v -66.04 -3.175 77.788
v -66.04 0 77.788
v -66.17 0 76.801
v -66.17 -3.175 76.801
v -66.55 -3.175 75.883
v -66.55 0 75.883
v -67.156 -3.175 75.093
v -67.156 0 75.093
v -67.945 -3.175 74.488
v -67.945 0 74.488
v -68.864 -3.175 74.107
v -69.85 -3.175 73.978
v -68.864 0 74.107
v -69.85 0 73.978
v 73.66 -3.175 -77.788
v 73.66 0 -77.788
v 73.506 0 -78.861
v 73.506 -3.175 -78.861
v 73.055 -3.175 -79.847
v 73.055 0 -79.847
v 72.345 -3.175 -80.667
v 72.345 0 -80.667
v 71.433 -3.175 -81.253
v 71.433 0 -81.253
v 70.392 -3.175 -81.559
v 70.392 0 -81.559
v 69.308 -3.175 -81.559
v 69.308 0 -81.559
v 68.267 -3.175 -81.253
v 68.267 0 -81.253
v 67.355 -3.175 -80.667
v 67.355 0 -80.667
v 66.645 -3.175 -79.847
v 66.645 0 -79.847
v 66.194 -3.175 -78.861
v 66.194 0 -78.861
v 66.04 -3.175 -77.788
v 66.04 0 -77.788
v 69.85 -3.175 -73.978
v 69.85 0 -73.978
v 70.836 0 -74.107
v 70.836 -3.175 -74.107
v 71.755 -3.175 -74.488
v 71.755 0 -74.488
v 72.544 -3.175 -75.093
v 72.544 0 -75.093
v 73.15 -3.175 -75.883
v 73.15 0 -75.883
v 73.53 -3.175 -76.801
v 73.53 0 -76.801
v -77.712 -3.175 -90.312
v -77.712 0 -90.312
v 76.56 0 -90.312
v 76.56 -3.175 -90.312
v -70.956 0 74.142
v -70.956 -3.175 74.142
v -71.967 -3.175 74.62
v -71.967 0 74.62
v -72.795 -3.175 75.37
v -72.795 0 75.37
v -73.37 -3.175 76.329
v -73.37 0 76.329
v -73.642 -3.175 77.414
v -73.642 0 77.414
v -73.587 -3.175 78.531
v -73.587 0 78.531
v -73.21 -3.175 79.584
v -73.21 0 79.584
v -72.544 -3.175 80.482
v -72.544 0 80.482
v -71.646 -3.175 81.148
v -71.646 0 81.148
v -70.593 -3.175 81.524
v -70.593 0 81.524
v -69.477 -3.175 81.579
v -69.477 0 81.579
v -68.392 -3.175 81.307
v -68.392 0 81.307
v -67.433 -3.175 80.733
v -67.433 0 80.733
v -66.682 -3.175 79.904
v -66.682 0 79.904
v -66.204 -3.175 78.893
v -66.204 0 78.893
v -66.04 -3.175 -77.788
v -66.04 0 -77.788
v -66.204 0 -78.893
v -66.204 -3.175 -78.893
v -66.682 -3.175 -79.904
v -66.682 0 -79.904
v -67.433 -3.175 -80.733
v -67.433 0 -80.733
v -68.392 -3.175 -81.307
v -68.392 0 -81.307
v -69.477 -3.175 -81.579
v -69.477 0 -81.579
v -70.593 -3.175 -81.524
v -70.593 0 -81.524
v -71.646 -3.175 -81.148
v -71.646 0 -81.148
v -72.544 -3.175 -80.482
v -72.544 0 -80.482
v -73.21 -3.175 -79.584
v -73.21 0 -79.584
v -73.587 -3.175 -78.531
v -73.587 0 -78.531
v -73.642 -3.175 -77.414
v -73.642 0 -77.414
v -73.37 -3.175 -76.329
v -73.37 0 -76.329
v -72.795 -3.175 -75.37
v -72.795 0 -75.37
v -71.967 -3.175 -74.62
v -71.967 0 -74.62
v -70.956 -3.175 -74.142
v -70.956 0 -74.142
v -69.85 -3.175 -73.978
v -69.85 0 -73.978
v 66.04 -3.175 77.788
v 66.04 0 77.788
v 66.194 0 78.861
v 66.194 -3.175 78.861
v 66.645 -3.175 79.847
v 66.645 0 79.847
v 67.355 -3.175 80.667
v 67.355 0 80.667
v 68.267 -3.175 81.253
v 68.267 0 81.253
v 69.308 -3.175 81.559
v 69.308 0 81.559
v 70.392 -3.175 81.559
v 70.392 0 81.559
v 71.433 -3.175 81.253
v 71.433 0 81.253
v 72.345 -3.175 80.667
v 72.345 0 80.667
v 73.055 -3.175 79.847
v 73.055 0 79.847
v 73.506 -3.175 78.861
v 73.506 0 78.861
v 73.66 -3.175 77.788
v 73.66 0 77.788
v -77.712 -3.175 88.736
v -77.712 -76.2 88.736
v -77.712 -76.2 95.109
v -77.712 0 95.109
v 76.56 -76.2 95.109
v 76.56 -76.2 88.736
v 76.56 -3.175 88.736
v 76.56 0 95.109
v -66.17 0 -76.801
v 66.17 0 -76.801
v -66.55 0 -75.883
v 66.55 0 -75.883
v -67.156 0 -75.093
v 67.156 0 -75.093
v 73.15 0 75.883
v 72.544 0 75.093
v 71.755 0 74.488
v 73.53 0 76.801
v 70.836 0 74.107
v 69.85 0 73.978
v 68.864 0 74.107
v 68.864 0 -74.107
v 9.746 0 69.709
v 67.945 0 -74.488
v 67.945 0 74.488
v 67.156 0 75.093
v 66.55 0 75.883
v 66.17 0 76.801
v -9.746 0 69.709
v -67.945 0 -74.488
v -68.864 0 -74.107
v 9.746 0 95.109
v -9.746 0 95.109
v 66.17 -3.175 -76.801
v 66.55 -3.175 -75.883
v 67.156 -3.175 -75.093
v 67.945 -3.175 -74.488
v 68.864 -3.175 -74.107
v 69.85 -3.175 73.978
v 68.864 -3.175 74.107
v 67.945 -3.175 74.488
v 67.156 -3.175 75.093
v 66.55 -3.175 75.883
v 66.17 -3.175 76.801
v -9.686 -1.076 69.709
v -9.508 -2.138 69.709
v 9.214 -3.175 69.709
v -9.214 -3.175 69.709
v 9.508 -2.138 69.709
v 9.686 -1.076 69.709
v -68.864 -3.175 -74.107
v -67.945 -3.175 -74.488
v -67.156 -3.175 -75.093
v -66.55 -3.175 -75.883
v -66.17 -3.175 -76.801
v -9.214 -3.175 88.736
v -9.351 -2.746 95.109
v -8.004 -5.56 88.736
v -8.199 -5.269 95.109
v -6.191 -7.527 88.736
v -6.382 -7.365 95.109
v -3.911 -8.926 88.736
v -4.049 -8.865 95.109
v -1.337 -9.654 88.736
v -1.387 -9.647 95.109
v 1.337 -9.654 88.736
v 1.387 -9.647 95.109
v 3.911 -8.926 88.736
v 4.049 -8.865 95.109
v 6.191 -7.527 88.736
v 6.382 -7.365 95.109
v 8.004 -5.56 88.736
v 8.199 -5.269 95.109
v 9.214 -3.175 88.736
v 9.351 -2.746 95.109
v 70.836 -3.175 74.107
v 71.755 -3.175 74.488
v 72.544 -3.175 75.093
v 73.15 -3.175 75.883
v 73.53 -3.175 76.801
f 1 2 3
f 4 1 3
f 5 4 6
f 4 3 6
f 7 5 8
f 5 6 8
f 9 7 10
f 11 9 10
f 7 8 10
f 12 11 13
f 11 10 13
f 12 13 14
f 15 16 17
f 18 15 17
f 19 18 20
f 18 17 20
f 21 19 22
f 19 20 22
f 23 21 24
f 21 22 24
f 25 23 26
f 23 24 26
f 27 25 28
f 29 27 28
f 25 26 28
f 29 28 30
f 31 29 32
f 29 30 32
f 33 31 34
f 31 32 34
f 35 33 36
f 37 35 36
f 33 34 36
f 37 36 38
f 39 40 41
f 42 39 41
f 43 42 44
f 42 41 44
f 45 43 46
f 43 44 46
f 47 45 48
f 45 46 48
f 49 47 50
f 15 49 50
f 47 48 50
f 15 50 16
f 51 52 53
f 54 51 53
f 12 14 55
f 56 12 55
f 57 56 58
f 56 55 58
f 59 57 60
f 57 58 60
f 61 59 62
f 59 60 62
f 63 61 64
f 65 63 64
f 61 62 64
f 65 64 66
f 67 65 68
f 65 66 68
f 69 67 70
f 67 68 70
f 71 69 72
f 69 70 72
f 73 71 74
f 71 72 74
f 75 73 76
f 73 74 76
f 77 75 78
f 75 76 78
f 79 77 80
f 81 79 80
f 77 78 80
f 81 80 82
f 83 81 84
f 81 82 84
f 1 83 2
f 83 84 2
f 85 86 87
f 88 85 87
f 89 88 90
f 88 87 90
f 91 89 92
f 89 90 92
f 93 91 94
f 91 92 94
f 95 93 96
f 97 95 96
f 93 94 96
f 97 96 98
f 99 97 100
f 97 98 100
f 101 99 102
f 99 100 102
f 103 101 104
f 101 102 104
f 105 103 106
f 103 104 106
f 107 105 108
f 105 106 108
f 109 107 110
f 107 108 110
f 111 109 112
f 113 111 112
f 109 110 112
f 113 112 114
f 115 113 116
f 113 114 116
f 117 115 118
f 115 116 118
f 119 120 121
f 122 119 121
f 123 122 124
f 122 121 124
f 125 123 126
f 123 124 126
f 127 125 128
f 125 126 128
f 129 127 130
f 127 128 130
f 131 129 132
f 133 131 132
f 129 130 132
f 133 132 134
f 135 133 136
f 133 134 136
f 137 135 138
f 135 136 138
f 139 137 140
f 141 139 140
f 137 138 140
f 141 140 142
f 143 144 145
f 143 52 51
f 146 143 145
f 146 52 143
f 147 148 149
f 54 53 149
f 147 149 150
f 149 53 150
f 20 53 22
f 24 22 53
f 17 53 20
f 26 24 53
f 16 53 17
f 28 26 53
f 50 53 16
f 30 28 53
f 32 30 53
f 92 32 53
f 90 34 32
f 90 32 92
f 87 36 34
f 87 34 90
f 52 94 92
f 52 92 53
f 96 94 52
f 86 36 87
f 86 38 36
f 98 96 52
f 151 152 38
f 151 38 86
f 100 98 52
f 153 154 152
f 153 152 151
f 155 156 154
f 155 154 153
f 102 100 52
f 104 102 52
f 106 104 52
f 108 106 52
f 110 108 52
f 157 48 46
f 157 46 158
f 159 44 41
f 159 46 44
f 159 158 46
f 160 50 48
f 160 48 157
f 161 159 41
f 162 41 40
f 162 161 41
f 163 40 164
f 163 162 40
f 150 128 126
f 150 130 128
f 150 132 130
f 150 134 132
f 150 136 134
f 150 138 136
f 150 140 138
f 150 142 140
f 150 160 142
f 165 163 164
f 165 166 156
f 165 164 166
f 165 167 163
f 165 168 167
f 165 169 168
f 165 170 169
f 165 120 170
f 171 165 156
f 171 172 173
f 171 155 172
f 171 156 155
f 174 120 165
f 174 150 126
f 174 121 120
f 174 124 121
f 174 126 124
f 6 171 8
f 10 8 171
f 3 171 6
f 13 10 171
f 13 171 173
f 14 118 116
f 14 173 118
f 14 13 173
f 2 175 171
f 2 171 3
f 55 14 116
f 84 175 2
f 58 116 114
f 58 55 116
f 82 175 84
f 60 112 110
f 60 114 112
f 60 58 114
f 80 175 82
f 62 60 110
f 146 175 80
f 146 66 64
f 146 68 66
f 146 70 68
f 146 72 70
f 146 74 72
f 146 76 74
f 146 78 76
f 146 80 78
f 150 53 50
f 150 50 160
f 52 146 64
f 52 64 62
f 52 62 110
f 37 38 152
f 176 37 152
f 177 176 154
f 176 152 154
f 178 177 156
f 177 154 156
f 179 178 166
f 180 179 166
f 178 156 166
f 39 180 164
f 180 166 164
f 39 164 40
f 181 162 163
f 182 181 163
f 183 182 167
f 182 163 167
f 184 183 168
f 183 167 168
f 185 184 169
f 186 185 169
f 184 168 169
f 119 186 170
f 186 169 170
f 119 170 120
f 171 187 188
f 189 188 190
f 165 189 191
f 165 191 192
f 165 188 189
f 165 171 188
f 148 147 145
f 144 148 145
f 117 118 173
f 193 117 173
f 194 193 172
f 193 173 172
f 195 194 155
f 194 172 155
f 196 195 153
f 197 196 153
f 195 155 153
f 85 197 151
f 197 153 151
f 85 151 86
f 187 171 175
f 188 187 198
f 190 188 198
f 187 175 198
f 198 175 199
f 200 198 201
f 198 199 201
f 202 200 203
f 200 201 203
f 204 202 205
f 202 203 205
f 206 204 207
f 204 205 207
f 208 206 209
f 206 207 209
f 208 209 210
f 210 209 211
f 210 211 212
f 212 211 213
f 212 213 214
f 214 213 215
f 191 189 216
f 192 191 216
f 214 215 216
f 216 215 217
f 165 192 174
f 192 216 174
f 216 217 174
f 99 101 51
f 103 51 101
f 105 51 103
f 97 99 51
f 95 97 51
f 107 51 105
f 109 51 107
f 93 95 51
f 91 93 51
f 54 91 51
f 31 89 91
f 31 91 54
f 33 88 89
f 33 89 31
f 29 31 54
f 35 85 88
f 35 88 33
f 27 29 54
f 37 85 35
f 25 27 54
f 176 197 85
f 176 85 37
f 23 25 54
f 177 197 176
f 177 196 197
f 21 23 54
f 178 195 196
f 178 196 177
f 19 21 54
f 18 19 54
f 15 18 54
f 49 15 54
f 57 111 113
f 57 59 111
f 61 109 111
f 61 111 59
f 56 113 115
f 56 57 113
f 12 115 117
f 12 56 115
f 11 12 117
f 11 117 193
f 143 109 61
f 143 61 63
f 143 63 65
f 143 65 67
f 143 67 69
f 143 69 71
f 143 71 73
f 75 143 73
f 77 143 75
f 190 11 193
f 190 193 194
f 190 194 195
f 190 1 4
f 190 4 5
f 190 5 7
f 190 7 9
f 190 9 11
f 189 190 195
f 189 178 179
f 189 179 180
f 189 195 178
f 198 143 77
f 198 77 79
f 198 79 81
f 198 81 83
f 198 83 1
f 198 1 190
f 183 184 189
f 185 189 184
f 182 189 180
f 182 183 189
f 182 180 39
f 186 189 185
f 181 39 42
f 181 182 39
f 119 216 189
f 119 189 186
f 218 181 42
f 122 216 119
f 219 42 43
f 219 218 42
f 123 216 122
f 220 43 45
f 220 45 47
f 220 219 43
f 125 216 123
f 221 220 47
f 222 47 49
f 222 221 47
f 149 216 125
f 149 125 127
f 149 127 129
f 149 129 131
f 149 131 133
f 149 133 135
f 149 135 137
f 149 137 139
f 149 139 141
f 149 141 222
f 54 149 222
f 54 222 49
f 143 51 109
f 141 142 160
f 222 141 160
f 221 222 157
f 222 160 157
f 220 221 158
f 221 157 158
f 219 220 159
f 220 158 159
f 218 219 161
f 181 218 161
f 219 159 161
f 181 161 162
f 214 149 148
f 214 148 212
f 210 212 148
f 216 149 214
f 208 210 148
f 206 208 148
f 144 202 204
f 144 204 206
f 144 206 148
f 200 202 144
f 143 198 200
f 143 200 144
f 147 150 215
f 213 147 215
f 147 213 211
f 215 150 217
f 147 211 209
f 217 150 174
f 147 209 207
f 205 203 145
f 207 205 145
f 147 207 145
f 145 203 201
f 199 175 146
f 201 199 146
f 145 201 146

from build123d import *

# Parameters (mm, degrees)
F1_DEPTH = 3.175
F2_W     = 154.2725488544
F2_H     = 6.3731148839
F3_DEPTH = 76.2
F4_R     = 9.7458637612
F5_DEPTH = 25.4


with BuildPart() as f1:
    # F0 (on Front) → F1 (new body)
    with BuildSketch(Plane.XZ):
        with BuildLine():
            ThreePointArc((-69.85, 73.9775), (-72.5440768363, 80.4815768363), (-66.04, 77.7875))
            Line((-66.04, 77.7875), (0, 77.7875))
            Line((0, 77.7875), (0, 88.7359380722))
            Line((0, 88.7359380722), (-77.7124390006, 88.7359380722))
            Line((-77.7124390006, 88.7359380722), (-77.7124390006, 0))
            Line((-77.7124390006, 0), (-69.85, 0))
            Line((-69.85, 0), (-69.85, 73.9775))
        make_face()
        with BuildLine():
            Line((0, 88.7359380722), (0, 77.7875))
            Line((0, 77.7875), (66.04, 77.7875))
            ThreePointArc((66.04, 77.7875), (69.85, 81.5975), (73.66, 77.7875))
            ThreePointArc((73.66, 77.7875), (72.5440768363, 75.0934231637), (69.85, 73.9775))
            Line((69.85, 73.9775), (69.85, 0))
            Line((69.85, 0), (76.5601098537, 0))
            Line((76.5601098537, 0), (76.5601098537, 88.7359380722))
            Line((76.5601098537, 88.7359380722), (0, 88.7359380722))
        make_face()
        with BuildLine():
            Line((66.04, -77.7875), (0, -77.7875))
            Line((0, -77.7875), (0, -90.3118550777))
            Line((0, -90.3118550777), (76.5601098537, -90.3118550777))
            Line((76.5601098537, -90.3118550777), (76.5601098537, 0))
            Line((76.5601098537, 0), (69.85, 0))
            Line((69.85, 0), (69.85, -73.9775))
            ThreePointArc((69.85, -73.9775), (72.5440768363, -75.0934231637), (73.66, -77.7875))
            ThreePointArc((73.66, -77.7875), (69.85, -81.5975), (66.04, -77.7875))
        make_face()
        with BuildLine():
            Line((-69.85, -73.9775), (-69.85, 0))
            Line((-69.85, 0), (-77.7124390006, 0))
            Line((-77.7124390006, 0), (-77.7124390006, -90.3118550777))
            Line((-77.7124390006, -90.3118550777), (0, -90.3118550777))
            Line((0, -90.3118550777), (0, -77.7875))
            Line((0, -77.7875), (-66.04, -77.7875))
            ThreePointArc((-66.04, -77.7875), (-72.5440768363, -80.4815768363), (-69.85, -73.9775))
        make_face()
        with BuildLine():
            Line((0, 0), (-69.85, 0))
            Line((-69.85, 0), (-69.85, -73.9775))
            ThreePointArc((-69.85, -73.9775), (-67.1559231637, -75.0934231637), (-66.04, -77.7875))
            Line((-66.04, -77.7875), (0, -77.7875))
            Line((0, -77.7875), (0, 0))
        make_face()
        with BuildLine():
            Line((0, 77.7875), (-66.04, 77.7875))
            ThreePointArc((-66.04, 77.7875), (-67.1559231637, 75.0934231637), (-69.85, 73.9775))
            Line((-69.85, 73.9775), (-69.85, 0))
            Line((-69.85, 0), (0, 0))
            Line((0, 0), (0, 77.7875))
        make_face()
        with BuildLine():
            Line((66.04, 77.7875), (0, 77.7875))
            Line((0, 77.7875), (0, 0))
            Line((0, 0), (69.85, 0))
            Line((69.85, 0), (69.85, 73.9775))
            ThreePointArc((69.85, 73.9775), (67.1559231637, 75.0934231637), (66.04, 77.7875))
        make_face()
        with BuildLine():
            Line((69.85, 0), (0, 0))
            Line((0, 0), (0, -77.7875))
            Line((0, -77.7875), (66.04, -77.7875))
            ThreePointArc((66.04, -77.7875), (67.1559231637, -75.0934231637), (69.85, -73.9775))
            Line((69.85, -73.9775), (69.85, 0))
        make_face()
    extrude(amount=F1_DEPTH)

    # F2 (on face) → F3 (join)
    with BuildSketch(Plane(origin=(0, 0, 0), x_dir=(-1, 0, 0), z_dir=(0, 1, 0))):
        with Locations((0.5761645734, 91.9224955142)):
            Rectangle(F2_W, F2_H)
    extrude(amount=-F3_DEPTH)

    # F4 (on face) → F5 (cut)
    with BuildSketch(Plane.XY.offset(95.1090529561)):
        Circle(F4_R)
    extrude(amount=-F5_DEPTH, mode=Mode.SUBTRACT)


solid = f1.part
